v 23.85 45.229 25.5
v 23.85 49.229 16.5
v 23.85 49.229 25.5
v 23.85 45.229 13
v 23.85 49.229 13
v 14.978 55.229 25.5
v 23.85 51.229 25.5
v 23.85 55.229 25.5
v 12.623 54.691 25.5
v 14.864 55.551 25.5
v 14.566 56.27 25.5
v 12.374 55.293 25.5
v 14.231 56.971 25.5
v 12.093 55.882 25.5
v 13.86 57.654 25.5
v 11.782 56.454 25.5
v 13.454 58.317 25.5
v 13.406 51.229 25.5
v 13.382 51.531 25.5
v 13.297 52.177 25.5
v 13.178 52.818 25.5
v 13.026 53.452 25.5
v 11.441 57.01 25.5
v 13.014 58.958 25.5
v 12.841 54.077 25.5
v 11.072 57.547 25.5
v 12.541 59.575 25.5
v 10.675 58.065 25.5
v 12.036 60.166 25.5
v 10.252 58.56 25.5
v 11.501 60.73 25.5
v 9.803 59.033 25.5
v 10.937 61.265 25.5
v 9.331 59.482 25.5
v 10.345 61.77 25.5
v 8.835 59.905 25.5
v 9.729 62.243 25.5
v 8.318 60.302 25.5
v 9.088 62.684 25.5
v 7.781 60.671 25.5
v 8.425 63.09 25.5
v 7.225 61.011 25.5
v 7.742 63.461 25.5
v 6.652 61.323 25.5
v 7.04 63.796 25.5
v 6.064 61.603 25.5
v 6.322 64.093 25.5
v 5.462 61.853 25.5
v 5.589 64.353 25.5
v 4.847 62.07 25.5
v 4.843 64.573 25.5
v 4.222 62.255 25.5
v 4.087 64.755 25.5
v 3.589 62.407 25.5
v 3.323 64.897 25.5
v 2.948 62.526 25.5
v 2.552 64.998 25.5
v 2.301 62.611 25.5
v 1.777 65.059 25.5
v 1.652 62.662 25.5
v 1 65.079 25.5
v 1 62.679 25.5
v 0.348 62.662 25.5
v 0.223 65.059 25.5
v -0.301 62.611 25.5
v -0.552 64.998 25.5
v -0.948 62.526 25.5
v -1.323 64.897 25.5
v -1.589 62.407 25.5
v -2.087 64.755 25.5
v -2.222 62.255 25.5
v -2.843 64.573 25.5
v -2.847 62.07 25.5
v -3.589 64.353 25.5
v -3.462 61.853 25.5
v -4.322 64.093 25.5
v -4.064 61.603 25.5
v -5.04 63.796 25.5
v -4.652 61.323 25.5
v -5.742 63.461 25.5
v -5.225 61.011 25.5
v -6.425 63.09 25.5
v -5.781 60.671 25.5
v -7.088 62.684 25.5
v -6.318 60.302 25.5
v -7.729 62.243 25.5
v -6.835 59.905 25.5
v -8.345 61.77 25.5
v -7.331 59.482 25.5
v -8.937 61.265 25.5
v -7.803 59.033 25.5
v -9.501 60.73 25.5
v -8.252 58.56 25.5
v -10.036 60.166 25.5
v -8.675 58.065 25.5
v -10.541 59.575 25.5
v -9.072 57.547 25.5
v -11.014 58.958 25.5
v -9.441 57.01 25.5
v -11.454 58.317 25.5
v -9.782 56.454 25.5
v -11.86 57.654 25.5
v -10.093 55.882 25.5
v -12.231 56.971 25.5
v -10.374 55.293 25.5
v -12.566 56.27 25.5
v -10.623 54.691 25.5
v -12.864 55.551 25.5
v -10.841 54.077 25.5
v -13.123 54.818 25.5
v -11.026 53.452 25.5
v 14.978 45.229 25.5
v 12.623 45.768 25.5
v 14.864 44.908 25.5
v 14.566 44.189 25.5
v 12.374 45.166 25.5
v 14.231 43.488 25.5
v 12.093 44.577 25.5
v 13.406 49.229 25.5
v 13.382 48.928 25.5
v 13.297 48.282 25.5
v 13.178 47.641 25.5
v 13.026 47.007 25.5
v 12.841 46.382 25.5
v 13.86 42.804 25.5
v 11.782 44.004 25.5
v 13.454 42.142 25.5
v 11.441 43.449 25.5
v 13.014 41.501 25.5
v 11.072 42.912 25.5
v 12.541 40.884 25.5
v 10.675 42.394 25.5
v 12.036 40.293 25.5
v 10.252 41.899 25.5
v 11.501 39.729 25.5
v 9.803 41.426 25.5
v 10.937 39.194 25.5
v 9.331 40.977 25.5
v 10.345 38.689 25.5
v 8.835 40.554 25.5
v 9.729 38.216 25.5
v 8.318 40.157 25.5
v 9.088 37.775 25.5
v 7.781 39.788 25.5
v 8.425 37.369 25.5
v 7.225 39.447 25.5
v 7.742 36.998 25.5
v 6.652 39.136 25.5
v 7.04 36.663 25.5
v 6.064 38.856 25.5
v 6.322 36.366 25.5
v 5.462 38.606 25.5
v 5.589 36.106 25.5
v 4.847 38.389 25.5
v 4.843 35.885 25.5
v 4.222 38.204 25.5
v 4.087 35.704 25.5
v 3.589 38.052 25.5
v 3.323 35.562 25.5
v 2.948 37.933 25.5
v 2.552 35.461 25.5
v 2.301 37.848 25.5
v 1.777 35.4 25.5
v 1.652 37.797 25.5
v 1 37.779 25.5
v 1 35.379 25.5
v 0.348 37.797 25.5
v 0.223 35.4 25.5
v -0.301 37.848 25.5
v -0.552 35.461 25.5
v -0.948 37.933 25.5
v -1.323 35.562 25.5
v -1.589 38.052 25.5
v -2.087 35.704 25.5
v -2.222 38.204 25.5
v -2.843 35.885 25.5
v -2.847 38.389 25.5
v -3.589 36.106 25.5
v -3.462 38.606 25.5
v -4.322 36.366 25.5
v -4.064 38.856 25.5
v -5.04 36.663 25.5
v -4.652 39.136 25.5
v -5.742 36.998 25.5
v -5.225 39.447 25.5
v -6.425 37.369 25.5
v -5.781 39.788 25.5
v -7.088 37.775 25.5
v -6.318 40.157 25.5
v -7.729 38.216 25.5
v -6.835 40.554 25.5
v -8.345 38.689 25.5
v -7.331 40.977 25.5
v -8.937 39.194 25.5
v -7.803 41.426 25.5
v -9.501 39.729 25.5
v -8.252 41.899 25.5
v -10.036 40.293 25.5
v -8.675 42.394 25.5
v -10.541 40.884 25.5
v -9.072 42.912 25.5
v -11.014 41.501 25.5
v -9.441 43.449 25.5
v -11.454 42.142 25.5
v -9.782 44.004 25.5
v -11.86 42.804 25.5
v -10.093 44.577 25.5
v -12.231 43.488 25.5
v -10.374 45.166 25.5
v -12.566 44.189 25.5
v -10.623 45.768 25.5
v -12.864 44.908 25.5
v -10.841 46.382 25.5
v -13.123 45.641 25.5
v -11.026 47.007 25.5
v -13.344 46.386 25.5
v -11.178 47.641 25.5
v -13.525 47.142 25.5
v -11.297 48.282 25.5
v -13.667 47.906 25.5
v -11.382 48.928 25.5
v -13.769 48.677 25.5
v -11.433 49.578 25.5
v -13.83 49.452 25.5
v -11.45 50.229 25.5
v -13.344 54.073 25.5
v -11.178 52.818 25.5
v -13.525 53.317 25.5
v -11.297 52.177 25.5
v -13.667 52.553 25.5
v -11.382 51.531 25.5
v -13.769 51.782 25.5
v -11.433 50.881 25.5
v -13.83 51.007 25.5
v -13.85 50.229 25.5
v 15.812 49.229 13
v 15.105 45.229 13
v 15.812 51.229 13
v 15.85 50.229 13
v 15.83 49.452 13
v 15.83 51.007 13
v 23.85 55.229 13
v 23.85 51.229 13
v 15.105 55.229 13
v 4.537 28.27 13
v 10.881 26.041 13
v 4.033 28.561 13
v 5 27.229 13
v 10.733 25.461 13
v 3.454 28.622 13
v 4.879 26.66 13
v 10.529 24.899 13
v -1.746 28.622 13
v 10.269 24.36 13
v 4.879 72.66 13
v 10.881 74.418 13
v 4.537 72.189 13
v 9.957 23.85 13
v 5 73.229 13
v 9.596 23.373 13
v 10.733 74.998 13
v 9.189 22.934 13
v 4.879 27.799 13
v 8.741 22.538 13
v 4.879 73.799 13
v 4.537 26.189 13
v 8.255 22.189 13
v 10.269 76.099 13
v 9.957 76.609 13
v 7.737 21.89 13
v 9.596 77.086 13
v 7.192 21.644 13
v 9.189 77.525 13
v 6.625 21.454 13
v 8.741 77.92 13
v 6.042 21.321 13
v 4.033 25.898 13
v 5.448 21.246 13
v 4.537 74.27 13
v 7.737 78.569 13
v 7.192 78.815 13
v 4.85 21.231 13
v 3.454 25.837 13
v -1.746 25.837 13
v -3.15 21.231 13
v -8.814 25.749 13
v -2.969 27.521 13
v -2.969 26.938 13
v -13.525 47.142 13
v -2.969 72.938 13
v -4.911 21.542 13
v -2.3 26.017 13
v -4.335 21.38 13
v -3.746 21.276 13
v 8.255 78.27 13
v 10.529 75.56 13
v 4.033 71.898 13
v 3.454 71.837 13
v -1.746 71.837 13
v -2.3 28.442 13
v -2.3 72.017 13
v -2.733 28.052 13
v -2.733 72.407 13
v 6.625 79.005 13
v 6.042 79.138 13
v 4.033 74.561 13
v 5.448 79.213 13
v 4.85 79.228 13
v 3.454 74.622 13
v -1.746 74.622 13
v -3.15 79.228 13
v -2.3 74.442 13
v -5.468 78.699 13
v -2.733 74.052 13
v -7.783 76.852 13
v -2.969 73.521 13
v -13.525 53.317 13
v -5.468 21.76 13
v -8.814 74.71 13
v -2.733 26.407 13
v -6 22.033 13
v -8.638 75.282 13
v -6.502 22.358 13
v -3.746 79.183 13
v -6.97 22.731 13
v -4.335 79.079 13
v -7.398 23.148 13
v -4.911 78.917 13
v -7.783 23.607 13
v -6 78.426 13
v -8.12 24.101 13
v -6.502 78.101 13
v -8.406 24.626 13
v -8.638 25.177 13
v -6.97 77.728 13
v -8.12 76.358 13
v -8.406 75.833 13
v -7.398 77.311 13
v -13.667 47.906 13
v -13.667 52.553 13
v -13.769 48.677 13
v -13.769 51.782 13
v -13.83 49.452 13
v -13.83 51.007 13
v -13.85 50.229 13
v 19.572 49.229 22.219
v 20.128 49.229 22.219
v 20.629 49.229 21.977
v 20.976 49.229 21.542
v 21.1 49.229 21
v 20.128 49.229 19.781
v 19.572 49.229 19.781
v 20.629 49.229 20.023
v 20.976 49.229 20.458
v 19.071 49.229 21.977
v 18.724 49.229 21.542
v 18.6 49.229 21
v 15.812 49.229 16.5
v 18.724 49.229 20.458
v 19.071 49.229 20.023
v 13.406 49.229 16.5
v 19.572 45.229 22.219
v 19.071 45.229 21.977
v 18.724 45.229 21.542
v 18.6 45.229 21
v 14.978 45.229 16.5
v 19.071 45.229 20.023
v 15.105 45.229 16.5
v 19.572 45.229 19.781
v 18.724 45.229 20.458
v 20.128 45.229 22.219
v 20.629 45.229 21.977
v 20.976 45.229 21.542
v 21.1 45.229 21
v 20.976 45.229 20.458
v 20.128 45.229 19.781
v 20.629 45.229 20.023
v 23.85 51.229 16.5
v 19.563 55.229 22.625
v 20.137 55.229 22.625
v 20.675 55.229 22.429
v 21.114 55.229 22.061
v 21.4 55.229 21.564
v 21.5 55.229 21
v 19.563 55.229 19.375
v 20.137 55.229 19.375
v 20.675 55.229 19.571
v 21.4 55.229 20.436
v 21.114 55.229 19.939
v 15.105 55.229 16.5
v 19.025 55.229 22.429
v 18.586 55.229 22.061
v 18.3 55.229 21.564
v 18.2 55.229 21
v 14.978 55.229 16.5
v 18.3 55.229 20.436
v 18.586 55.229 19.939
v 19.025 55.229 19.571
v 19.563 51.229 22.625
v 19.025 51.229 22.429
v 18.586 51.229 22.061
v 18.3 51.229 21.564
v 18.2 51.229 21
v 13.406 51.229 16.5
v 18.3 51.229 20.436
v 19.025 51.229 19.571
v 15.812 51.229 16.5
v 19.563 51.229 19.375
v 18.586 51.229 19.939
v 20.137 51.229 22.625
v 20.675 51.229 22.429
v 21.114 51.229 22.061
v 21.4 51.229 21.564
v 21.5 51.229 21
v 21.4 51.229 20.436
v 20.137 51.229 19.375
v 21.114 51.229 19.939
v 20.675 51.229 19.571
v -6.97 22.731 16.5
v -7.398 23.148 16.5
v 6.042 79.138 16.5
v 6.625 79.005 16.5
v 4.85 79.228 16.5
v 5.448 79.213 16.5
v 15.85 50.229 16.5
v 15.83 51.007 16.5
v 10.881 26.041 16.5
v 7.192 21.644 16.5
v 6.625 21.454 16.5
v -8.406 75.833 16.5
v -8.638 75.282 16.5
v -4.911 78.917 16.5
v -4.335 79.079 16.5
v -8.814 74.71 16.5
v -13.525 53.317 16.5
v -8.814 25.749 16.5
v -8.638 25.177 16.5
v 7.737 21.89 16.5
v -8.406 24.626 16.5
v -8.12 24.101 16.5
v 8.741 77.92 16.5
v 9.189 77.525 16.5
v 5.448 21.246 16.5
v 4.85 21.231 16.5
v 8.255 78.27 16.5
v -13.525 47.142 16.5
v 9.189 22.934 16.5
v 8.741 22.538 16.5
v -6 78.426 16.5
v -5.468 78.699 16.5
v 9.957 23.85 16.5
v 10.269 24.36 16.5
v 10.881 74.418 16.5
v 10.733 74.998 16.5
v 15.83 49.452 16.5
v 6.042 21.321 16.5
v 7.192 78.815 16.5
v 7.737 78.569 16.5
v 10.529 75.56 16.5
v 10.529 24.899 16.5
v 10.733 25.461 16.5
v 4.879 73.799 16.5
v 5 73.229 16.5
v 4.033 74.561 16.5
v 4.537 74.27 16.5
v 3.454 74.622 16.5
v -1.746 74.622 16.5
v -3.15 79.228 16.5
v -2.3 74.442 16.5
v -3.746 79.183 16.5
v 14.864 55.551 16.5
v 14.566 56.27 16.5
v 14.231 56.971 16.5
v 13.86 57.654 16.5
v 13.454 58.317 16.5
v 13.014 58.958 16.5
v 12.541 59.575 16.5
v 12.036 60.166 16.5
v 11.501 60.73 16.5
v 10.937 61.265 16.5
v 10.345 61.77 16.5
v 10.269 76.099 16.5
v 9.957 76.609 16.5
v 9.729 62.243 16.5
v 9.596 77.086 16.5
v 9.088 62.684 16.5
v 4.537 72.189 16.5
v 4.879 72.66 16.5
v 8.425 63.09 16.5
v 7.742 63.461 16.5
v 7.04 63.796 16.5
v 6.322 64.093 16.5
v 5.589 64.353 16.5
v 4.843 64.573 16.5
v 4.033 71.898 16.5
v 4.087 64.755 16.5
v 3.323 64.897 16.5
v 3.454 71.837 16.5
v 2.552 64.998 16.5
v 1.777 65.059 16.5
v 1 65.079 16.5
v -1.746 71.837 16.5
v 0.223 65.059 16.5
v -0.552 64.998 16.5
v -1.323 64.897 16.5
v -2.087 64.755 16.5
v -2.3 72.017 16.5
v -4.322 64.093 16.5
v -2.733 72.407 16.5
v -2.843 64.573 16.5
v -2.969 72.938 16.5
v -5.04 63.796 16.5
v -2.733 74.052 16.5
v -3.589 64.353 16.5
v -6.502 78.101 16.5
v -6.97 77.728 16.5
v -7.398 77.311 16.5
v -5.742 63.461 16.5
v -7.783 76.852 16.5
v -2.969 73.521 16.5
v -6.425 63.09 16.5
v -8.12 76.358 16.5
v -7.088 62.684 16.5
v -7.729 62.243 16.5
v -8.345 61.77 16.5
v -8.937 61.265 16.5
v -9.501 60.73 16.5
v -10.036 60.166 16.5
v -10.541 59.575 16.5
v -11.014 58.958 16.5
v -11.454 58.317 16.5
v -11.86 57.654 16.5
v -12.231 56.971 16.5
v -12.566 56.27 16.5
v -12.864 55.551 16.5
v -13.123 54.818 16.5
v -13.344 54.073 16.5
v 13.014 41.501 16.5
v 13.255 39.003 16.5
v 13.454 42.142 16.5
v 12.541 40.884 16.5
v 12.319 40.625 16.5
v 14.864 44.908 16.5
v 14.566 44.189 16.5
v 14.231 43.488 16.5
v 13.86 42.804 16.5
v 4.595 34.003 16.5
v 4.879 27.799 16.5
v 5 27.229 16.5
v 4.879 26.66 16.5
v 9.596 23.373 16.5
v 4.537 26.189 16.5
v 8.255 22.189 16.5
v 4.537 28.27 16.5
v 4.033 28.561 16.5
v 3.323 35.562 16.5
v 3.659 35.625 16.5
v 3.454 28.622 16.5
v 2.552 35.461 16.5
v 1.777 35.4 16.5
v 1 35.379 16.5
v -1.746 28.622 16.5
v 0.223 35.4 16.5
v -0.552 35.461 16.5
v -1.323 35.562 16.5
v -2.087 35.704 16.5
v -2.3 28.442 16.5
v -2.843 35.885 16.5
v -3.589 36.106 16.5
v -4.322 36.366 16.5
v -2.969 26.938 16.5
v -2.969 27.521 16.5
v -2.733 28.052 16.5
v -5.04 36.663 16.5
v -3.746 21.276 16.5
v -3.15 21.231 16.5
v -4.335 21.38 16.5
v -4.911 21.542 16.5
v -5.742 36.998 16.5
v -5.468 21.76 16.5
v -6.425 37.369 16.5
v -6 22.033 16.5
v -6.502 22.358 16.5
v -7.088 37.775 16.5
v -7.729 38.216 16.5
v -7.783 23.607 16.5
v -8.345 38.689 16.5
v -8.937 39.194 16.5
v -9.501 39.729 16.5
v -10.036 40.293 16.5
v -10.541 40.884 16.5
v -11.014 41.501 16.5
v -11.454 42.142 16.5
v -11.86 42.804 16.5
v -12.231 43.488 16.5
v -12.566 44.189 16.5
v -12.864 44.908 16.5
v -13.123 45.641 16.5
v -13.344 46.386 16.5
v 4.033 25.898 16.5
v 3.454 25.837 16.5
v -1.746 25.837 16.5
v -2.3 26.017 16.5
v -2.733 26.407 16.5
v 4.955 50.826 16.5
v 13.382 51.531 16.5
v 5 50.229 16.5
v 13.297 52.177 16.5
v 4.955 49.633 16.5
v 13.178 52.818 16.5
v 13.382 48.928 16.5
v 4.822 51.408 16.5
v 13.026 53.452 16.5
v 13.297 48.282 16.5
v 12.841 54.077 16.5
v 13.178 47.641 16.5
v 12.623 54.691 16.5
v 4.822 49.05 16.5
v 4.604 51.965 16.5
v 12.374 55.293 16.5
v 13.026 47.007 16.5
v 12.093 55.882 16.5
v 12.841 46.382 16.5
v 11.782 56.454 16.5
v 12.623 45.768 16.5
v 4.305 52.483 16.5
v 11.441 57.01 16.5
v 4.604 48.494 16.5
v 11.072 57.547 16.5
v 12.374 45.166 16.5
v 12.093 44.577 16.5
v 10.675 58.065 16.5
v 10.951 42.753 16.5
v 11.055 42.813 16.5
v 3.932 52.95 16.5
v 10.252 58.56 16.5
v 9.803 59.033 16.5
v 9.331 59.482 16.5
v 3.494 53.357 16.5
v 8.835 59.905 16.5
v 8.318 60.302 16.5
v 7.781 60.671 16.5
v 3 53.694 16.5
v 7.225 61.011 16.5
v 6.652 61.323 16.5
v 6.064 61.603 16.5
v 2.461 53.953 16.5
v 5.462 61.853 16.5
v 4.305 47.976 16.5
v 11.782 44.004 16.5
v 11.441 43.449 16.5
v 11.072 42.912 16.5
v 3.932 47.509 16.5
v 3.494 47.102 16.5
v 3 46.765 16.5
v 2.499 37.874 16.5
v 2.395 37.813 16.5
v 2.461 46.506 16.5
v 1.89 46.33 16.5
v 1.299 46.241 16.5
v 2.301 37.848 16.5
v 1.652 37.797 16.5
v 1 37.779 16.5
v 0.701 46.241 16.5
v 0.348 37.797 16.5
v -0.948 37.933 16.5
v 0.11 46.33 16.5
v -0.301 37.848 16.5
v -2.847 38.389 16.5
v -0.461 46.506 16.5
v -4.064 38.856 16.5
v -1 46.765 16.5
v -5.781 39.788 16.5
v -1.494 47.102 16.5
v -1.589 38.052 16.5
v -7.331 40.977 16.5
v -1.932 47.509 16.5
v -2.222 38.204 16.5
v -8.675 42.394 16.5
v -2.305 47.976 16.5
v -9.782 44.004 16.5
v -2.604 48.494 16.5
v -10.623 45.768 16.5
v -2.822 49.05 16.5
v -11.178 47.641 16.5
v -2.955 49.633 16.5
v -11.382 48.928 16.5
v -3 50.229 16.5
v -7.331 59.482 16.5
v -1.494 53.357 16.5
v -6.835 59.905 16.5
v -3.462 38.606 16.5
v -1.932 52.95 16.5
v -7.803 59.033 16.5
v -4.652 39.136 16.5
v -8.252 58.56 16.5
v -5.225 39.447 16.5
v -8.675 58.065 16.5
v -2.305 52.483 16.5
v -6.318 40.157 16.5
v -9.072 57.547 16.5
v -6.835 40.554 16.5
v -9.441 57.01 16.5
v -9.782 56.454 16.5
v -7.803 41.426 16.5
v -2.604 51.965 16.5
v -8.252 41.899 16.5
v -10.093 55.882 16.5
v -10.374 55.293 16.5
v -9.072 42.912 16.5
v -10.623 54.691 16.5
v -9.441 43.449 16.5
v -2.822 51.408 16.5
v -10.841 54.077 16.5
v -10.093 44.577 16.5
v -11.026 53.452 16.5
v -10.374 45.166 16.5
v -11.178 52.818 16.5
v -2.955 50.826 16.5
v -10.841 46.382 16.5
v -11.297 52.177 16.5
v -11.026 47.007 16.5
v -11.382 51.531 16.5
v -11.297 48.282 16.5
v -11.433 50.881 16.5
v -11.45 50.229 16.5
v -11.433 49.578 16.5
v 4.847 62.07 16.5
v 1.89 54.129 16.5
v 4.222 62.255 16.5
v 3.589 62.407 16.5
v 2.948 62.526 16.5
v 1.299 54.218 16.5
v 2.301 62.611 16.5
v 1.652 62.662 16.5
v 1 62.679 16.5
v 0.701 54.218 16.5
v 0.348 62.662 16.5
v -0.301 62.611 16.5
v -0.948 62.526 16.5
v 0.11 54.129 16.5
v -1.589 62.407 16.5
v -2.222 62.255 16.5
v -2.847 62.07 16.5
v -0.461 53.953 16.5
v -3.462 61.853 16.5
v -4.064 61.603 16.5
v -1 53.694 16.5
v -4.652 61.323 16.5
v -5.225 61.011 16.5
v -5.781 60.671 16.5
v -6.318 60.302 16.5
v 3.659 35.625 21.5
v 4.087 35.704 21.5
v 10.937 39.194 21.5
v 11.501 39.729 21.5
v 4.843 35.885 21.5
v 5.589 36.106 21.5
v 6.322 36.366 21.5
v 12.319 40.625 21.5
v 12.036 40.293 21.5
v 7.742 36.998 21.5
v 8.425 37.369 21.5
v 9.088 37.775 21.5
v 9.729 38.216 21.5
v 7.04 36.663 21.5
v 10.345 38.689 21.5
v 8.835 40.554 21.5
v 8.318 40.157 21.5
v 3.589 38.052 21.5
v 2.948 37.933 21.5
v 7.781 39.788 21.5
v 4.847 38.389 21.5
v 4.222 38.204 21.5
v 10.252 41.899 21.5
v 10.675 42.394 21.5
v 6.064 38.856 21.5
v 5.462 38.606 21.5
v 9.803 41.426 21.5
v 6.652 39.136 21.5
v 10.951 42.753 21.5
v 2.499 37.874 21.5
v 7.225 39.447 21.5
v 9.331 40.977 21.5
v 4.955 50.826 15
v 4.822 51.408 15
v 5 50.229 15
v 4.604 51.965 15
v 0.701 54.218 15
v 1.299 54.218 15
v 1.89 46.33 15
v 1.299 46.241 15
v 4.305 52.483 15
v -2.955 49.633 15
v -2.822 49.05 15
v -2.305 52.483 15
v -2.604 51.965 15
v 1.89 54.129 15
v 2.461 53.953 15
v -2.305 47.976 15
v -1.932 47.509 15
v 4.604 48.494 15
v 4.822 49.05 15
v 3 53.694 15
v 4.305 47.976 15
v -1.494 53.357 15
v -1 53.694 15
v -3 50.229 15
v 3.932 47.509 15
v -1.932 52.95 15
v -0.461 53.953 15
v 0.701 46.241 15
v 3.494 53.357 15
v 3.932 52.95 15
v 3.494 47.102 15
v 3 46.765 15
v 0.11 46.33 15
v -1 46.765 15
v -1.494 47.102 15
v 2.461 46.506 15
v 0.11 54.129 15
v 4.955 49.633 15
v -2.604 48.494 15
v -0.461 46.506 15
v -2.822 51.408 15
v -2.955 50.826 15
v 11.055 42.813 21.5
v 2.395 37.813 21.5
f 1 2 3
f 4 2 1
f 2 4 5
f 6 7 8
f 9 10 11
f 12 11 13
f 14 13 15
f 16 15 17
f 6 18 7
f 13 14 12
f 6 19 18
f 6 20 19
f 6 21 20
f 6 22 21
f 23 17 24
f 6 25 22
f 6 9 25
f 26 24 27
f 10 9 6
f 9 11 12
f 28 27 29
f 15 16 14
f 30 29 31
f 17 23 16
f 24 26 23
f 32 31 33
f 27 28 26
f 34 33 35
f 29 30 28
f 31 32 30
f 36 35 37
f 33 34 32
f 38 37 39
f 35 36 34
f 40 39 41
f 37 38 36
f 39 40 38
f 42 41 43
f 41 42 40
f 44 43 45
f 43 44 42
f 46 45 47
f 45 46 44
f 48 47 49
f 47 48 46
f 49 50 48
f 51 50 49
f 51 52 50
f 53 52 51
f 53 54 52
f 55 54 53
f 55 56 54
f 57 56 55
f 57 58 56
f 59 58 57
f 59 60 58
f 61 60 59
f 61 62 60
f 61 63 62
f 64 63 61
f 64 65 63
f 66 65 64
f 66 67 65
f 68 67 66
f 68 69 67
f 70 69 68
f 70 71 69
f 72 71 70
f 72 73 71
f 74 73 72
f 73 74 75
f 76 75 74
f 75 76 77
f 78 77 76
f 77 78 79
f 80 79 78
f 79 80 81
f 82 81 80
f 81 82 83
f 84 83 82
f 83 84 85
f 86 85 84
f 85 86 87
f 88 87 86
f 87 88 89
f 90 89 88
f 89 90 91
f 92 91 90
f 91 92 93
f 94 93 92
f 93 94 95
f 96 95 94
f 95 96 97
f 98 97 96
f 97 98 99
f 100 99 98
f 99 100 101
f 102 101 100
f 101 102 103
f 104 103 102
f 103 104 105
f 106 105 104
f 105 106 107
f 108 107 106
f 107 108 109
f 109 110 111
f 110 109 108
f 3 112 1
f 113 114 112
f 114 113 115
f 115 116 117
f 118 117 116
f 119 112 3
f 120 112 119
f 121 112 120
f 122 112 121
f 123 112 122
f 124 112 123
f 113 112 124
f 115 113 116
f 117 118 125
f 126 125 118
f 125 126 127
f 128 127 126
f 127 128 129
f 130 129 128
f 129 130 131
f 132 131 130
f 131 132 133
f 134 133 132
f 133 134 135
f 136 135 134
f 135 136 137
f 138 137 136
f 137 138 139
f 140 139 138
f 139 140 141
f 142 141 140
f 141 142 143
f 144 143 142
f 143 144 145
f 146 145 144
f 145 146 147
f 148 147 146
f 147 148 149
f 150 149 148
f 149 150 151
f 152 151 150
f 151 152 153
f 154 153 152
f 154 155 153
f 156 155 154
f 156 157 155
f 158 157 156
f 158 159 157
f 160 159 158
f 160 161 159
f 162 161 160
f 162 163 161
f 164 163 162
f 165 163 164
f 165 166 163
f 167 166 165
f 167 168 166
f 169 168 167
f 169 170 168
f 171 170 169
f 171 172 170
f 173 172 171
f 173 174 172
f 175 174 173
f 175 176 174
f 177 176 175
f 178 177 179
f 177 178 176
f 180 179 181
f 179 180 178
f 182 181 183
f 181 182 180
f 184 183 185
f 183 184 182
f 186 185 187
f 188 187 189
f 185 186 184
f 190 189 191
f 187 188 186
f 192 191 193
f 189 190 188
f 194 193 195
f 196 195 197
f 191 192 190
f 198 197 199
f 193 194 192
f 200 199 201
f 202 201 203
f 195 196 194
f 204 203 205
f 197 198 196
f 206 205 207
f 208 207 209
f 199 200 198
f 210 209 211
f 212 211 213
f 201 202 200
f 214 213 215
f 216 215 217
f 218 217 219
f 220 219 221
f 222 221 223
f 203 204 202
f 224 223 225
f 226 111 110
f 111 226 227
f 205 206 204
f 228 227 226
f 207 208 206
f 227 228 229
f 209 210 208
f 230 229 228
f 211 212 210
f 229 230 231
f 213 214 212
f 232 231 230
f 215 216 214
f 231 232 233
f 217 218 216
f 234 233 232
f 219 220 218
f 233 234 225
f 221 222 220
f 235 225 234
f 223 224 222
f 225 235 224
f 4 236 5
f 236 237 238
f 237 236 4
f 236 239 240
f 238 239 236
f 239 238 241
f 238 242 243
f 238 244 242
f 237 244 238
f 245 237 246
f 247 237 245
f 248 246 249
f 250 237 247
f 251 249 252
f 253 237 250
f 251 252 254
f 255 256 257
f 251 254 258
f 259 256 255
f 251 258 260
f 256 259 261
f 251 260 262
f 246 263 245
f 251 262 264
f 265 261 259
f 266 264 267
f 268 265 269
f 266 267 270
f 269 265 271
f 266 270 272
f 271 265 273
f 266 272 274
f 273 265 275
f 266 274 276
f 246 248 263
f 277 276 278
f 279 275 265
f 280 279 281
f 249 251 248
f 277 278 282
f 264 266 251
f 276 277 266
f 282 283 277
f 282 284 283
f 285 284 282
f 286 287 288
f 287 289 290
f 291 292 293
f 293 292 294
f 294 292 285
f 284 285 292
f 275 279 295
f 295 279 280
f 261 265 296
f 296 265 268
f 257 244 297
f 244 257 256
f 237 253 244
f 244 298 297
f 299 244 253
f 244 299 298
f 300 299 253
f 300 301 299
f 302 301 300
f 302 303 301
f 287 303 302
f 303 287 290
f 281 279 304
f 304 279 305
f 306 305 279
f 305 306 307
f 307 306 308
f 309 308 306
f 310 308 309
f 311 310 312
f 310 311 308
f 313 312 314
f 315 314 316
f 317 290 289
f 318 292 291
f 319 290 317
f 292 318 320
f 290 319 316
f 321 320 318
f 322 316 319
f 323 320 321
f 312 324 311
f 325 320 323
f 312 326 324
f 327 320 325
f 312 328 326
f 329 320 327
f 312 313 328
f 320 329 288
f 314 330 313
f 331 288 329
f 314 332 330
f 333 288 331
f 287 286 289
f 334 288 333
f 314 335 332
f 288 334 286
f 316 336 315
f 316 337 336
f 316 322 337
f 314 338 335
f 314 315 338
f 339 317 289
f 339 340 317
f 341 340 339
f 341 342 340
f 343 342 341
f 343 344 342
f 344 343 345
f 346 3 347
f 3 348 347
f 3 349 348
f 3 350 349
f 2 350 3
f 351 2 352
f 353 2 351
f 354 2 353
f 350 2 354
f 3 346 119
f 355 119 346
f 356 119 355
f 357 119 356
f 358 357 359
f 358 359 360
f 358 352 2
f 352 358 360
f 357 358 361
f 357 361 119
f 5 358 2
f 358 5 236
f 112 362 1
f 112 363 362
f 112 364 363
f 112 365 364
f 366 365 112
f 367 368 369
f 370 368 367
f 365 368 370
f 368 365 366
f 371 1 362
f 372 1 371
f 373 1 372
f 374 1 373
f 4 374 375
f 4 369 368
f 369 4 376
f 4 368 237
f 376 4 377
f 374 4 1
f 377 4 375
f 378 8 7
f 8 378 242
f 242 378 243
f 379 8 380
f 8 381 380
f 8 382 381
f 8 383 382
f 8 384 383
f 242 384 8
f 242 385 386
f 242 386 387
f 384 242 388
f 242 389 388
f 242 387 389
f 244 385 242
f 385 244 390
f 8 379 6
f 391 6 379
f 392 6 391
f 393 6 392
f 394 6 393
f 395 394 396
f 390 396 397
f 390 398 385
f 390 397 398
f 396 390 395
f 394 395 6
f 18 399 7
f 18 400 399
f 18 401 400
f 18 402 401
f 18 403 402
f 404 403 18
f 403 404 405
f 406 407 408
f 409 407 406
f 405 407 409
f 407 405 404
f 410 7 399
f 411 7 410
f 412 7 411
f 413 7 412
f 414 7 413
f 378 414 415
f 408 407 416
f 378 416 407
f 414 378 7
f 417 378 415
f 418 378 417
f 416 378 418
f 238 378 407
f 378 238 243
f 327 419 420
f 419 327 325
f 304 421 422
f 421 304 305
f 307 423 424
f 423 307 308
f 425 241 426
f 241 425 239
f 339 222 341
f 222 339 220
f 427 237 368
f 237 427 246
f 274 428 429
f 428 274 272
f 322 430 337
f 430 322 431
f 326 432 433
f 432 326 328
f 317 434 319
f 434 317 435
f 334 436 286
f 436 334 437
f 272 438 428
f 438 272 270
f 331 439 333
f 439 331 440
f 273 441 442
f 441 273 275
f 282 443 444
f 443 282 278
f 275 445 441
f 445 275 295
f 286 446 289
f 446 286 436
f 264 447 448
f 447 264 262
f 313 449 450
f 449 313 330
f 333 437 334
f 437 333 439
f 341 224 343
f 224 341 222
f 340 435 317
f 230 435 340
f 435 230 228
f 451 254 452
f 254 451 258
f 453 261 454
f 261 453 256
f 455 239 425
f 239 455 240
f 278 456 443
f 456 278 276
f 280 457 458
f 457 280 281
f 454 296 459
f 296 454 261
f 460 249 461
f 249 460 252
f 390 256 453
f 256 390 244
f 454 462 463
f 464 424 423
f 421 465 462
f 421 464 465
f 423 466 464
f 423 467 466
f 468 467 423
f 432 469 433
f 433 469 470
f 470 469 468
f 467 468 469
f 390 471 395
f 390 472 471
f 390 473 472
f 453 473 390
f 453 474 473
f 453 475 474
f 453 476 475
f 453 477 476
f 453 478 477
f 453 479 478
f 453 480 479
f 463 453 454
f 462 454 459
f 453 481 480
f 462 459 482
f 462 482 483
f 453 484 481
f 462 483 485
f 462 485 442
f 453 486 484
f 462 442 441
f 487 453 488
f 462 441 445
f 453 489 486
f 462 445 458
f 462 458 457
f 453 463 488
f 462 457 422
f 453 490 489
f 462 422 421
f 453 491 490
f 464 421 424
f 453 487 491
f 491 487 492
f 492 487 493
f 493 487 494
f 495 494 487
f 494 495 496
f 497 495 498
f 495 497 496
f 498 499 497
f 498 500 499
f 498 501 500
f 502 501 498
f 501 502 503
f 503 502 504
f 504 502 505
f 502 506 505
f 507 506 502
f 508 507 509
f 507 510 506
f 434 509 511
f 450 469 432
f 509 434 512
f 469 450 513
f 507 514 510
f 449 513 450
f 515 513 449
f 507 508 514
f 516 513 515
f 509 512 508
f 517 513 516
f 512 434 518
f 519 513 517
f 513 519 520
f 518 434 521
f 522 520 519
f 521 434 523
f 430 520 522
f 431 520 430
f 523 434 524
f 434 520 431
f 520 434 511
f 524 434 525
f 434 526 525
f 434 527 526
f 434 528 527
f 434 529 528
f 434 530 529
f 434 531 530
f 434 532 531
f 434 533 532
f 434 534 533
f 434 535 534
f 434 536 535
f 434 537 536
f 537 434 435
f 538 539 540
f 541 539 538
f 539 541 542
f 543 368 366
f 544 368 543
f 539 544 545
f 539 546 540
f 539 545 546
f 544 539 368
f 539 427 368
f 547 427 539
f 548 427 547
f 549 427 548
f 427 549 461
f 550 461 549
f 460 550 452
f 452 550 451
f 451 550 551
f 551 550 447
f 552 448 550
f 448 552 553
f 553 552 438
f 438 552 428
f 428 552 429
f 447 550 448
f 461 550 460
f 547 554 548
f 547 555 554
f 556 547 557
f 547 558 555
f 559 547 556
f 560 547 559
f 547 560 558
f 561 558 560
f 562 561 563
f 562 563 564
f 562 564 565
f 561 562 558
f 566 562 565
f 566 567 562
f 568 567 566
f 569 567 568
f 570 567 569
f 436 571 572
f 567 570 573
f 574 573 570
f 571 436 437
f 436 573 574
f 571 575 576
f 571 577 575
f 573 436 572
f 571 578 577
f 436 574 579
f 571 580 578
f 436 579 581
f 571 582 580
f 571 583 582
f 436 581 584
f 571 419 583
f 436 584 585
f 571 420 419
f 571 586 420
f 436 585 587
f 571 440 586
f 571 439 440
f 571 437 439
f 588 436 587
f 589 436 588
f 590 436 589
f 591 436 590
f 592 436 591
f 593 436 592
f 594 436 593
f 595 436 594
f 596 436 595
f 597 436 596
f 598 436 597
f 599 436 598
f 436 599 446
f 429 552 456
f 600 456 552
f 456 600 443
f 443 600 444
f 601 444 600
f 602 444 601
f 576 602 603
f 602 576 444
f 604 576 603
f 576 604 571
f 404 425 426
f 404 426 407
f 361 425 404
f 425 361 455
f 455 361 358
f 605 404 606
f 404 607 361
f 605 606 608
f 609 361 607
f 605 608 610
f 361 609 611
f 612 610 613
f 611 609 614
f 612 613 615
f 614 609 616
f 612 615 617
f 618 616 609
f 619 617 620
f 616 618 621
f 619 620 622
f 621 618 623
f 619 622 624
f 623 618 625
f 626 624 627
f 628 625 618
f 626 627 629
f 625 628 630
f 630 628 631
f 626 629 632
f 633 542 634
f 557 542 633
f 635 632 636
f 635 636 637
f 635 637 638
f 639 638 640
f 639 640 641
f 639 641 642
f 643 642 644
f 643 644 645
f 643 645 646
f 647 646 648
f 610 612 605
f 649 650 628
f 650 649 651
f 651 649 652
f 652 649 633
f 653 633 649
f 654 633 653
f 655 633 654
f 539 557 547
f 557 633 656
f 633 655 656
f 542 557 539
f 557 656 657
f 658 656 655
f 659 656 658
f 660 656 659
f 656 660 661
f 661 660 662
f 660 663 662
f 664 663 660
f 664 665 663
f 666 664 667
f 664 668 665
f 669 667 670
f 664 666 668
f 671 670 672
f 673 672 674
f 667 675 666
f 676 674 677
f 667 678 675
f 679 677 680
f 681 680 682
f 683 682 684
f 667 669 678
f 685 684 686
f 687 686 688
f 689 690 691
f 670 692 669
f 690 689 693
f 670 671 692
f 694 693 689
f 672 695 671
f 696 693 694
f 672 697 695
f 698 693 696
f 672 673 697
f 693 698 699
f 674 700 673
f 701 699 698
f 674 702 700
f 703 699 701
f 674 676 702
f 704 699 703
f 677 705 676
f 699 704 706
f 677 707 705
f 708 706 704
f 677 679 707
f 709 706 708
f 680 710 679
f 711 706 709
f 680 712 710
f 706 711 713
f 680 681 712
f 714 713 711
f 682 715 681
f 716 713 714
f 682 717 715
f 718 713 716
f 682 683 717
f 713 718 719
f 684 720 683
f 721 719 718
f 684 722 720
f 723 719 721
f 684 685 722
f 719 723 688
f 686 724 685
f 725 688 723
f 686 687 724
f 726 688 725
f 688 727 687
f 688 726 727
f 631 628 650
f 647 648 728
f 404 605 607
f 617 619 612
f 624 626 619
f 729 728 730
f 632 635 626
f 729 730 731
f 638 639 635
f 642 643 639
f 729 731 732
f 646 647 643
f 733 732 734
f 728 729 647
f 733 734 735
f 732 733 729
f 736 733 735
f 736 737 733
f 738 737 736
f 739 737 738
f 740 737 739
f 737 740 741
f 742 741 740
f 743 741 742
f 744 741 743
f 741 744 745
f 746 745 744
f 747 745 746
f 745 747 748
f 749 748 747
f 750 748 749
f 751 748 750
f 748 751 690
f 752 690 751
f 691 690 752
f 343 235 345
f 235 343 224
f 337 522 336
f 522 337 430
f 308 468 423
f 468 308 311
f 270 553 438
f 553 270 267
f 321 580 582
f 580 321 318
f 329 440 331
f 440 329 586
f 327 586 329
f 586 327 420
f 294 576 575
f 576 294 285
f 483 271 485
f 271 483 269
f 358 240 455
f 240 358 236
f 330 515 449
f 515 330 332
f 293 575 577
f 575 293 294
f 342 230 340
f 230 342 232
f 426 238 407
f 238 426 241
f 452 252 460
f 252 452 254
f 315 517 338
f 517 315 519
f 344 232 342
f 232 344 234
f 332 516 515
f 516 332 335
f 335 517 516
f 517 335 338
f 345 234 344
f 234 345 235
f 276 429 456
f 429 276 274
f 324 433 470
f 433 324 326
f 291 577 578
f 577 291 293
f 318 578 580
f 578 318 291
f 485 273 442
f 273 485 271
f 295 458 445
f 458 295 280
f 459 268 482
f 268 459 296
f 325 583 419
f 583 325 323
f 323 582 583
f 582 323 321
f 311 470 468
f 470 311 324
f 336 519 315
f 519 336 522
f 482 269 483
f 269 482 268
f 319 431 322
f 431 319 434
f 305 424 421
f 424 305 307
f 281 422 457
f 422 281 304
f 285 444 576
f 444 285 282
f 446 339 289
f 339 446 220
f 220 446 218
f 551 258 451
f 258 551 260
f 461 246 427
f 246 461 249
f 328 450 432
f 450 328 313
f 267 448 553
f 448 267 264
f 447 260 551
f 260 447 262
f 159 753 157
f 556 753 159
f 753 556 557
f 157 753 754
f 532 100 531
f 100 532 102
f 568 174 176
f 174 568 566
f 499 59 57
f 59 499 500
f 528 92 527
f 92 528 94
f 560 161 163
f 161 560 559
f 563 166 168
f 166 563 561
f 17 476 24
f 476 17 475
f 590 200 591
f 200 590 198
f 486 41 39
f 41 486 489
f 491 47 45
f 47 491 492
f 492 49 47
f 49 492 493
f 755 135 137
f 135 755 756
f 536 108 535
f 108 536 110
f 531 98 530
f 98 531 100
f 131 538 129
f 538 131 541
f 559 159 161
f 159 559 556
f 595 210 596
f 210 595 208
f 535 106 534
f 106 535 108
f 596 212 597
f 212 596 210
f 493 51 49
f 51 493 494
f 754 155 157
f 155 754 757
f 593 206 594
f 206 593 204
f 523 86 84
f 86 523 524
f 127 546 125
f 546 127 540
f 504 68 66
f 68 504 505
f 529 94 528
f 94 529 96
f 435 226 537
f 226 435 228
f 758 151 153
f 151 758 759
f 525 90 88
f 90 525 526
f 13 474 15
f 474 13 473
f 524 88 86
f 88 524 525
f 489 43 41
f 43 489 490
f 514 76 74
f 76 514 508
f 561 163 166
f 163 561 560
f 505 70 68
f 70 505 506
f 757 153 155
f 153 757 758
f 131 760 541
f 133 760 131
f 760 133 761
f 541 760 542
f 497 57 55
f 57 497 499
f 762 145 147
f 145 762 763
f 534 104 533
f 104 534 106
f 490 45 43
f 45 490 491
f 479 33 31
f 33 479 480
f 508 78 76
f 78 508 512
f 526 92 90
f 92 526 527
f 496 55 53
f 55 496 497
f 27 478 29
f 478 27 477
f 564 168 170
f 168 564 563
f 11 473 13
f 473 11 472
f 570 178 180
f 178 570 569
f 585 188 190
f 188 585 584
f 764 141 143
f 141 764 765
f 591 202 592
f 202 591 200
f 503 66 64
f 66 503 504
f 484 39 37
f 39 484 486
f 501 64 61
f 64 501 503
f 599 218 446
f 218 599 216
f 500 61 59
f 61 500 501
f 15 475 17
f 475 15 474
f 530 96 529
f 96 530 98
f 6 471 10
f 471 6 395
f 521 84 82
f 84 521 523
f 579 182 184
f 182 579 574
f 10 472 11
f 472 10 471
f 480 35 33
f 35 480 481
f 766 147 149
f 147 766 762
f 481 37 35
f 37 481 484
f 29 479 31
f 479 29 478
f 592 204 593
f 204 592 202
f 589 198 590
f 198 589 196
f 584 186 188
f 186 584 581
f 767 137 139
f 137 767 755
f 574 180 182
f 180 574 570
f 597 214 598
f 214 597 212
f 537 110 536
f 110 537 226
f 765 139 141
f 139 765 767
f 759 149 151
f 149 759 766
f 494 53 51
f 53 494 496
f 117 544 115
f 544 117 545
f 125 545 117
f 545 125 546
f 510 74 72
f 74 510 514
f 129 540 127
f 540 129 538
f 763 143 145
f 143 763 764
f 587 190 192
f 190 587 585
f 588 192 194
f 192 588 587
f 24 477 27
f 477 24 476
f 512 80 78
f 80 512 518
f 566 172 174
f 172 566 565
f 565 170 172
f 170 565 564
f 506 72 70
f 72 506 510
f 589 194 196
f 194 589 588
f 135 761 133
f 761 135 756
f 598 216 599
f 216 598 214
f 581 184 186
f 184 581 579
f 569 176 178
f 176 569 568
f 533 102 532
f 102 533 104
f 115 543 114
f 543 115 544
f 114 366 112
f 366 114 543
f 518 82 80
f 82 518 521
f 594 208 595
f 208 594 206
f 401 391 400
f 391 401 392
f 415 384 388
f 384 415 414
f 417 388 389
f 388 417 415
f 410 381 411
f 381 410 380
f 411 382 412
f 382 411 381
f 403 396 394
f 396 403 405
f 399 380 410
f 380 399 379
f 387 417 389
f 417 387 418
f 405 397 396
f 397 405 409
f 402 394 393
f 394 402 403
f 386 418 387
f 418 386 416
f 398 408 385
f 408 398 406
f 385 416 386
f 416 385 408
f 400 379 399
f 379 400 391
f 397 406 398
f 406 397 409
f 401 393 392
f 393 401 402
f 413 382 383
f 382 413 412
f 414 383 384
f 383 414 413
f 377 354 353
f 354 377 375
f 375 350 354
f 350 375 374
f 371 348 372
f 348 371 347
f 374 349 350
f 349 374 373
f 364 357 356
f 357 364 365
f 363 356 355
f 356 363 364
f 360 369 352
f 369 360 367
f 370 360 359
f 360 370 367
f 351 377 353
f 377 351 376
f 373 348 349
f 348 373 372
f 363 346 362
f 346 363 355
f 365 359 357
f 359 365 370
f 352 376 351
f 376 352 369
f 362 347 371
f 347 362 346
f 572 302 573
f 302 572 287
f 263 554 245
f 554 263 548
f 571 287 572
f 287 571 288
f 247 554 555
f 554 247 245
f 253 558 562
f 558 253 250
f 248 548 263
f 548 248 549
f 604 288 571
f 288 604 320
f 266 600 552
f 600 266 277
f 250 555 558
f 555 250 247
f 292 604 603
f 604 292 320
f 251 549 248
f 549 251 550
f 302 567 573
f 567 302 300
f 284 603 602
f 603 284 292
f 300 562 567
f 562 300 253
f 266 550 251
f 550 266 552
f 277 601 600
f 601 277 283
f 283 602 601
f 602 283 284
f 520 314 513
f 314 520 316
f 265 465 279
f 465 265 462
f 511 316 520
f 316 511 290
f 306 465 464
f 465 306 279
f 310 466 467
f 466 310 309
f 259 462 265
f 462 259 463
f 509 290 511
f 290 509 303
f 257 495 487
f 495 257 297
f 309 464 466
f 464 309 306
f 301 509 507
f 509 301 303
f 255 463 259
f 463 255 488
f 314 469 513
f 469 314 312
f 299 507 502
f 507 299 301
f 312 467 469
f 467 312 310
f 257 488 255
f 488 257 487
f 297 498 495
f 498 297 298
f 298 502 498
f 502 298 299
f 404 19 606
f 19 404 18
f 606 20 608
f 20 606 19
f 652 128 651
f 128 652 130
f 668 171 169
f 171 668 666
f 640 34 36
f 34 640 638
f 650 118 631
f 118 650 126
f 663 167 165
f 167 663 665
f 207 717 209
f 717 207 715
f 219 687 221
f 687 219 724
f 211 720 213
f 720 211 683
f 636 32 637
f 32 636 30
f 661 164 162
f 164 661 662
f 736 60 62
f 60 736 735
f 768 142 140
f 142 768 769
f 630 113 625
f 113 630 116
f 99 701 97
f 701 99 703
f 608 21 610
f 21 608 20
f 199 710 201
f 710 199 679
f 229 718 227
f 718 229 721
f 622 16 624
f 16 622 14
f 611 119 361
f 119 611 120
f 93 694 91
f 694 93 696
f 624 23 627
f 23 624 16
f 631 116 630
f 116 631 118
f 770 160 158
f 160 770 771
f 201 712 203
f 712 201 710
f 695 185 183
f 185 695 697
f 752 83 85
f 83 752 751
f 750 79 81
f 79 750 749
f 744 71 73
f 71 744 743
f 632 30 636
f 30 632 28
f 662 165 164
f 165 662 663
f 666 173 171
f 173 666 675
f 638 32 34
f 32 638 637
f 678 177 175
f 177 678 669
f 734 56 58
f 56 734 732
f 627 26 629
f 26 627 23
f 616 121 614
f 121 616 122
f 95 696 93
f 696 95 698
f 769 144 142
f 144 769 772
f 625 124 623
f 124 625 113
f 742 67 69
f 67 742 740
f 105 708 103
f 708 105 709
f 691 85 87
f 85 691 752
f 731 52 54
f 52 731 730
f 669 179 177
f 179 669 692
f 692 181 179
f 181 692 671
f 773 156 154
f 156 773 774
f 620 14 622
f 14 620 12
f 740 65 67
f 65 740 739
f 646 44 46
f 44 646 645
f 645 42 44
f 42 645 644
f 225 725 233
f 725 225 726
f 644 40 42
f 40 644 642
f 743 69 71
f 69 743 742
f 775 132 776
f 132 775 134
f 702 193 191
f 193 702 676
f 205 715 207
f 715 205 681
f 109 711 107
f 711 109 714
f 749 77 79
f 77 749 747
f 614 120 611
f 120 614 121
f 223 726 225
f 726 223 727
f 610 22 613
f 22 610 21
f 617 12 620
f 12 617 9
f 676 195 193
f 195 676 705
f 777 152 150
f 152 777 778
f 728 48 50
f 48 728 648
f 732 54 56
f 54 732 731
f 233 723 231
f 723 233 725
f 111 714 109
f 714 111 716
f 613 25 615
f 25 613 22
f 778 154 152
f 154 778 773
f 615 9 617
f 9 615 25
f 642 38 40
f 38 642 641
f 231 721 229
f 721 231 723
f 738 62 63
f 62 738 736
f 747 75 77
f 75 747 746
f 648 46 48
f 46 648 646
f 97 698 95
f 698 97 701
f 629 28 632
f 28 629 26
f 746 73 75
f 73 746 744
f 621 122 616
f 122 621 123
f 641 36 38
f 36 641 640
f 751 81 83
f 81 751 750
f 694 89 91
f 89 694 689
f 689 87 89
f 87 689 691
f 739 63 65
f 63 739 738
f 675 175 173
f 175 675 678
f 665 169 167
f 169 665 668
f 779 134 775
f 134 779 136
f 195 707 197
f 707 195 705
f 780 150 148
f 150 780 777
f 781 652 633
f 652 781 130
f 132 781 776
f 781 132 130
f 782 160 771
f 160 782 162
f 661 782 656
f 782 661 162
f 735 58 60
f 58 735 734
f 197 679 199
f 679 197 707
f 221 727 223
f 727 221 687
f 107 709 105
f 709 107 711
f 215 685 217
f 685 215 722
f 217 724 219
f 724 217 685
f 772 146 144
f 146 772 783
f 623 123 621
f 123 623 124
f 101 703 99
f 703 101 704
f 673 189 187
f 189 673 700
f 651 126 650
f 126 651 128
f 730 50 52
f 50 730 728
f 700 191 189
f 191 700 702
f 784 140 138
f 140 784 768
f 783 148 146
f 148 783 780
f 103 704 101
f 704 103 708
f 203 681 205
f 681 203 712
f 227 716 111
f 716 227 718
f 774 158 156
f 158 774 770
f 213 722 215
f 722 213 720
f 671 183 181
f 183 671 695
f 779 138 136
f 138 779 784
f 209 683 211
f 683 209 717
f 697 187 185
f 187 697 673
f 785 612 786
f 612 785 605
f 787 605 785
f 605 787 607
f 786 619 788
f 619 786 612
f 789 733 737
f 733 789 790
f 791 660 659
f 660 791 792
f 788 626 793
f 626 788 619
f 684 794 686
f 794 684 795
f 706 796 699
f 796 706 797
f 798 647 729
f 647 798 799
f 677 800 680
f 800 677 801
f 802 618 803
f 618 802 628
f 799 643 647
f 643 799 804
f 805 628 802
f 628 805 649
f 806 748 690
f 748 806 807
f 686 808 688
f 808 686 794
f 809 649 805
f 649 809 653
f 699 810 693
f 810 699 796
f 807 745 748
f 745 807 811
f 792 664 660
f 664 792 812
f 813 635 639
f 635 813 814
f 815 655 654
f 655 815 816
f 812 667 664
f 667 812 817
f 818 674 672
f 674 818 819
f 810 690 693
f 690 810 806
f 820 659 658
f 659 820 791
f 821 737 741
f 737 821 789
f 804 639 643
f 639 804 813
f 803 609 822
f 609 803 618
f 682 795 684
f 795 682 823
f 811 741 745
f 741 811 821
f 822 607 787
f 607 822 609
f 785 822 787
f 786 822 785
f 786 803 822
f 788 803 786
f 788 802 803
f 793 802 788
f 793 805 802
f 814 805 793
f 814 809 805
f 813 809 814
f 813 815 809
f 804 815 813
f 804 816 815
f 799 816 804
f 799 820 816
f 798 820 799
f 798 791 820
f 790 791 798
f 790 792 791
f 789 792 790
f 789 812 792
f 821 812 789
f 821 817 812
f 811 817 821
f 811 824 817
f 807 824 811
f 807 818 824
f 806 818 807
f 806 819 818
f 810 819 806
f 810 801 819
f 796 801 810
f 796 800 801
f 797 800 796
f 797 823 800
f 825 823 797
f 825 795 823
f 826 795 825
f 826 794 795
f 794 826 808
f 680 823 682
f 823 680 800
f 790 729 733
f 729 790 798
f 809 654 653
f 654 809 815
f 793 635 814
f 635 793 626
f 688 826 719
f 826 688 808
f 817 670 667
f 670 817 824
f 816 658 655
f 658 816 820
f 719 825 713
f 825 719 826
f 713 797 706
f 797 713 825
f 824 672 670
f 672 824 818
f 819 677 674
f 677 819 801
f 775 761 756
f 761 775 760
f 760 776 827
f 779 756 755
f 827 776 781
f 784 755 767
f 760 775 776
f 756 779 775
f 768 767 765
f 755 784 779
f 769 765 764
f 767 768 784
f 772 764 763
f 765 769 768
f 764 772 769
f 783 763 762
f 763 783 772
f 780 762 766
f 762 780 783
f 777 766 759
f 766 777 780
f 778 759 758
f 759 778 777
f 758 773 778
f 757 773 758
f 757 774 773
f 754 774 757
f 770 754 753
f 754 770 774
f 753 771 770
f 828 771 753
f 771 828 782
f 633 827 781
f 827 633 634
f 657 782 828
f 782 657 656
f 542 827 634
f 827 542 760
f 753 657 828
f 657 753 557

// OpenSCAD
// file: ../../lib/common.scad
// ============================================================================
//  Вспомогательные модули общего назначения.
//  Подключать через use <lib/common.scad> — файл не содержит параметров
//  проекта и ни от чего не зависит.
// ============================================================================

_eps = 0.01;

// --------------------------------------------------------------------- 2D ---
// Прямоугольник со скруглёнными углами, по центру
module rrect(w, d, r) {
    rr = min(r, w/2 - _eps, d/2 - _eps);
    if (rr > 0) offset(r = rr) square([w - 2*rr, d - 2*rr], center = true);
    else square([w, d], center = true);
}

// --------------------------------------------------------------------- 3D ---
// Коробка со скруглением ТОЛЬКО вертикальных рёбер: нижние и верхние острые
module rounded_box(w, d, h, r) linear_extrude(height = h) rrect(w, d, r);

// Цилиндр с фасками на торцах (снимает «слоновью ногу» и облегчает посадку)
module chamfered_cyl(d, h, ch = 0.6, bottom = true, top = true) {
    r  = d/2;
    cb = bottom ? min(ch, h/2) : 0;
    ct = top    ? min(ch, h/2) : 0;
    if (cb <= 0 && ct <= 0) cylinder(d = d, h = h);
    else rotate_extrude(angle = 360) polygon(concat(
        [[0, 0]],
        cb > 0 ? [[r - cb, 0], [r, cb]] : [[r, 0]],
        ct > 0 ? [[r, h - ct], [r - ct, h]] : [[r, h]],
        [[0, h]]));
}

// Труба
module tube(od, id, h) difference() {
    cylinder(d = od, h = h);
    translate([0, 0, -_eps]) cylinder(d = id, h = h + 2*_eps);
}

// Сквозное отверстие, растянутое вверх-вниз для гарантированного вычитания
module thru(d, h) translate([0, 0, -_eps]) cylinder(d = d, h = h + 2*_eps);

// Потайное отверстие под саморез с конической головкой.
// Пластина занимает z = [0 .. t], головка утапливается сверху,
// саморез идёт вниз (в ответную стойку).
module countersunk_hole(free_d, head_d, t, down = 30) {
    cone_h = (head_d - free_d)/2;    // головка 90 градусов
    union() {
        translate([0, 0, -down]) cylinder(d = free_d, h = down + t - cone_h + _eps);
        translate([0, 0, t - cone_h]) cylinder(d1 = free_d, d2 = head_d, h = cone_h);
    }
}

// Паз (щелевое отверстие) длиной len по X, сквозной по высоте h
module slot(len, d, h) hull() for (s = [-1, 1])
    translate([s*(len - d)/2, 0, 0]) cylinder(d = d, h = h);

// Стойка под саморез: цилиндр с пилотным отверстием сверху.
// Снизу фаски нет — стойка растёт из дна детали.
module screw_boss(od, h, pilot_d, pilot_depth, ch = 0.6) difference() {
    chamfered_cyl(od, h, ch = ch, bottom = false, top = true);
    translate([0, 0, h - pilot_depth]) cylinder(d = pilot_d, h = pilot_depth + _eps);
}

// Треугольная косынка в плоскости XZ (катеты l по X и h по Z), толщина t по Y
module gusset(l, h, t) translate([0, -t/2, 0]) linear_extrude(height = t)
    polygon([[0, 0], [l, 0], [0, h]]);

// Конусное гнездо под заточенный винт-ось (ось Z вниз от z=0)
module cone_seat(d, depth) translate([0, 0, -depth])
    cylinder(d1 = 0.2, d2 = d, h = depth + _eps);

// Канавка под круглый пассик: тор, вычитаемый из обода
module belt_groove(pulley_d, groove_r) rotate_extrude(angle = 360)
    translate([pulley_d/2, 0]) circle(r = groove_r);

// Сетка облегчающих отверстий по кругу
module radial_holes(n, r, d, h) for (i = [0 : n - 1])
    rotate([0, 0, i*360/n]) translate([r, 0, 0]) thru(d, h);
// main file
// ============================================================================
//  ДЕРЖАТЕЛЬ ДВИГАТЕЛЯ RF-300C-14270
//
//  Стакан с хомутом: двигатель стоит донцем на дне держателя валом вверх,
//  обжимается стяжным винтом 3 x 16. Толщина дна выставляет канавку
//  заводского колеса ровно в плоскость пассика 1 (см. motor_groove_z).
//  Две лапы с пазами вдоль линии «промвал — двигатель»: сдвигом
//  натягивается пассик 1. Крепится к шасси двумя саморезами 2.5 x 8.
//
//  Самая «расходная» деталь модуля: другой двигатель или неточная высота
//  канавки — перепечатывается только она.
//
//  Печать: как есть, дном на стол.
// ============================================================================

include <../drive_params.scad>
use <../../lib/common.scad>

module drive_motor_holder() {
    cup_top = holder_base_t + holder_cup_h;
    translate([motor_pos[0], motor_pos[1], holder_z0]) rotate([0, 0, motor_angle])
    difference() {
        union() {
            // основание с лапами
            hull() {
                cylinder(d = holder_cup_od, h = holder_base_t);
                for (s = [-1, 1], dx = [-1, 1])
                    translate([dx*holder_slot_len/2, s*holder_foot_span/2, 0])
                        cylinder(d = holder_foot_d, h = holder_base_t);
            }
            cylinder(d = holder_cup_od, h = cup_top);
            // уши стяжного винта — с внешней стороны, подальше от пассика
            for (s = [-1, 1])
                translate([holder_cup_od/2 - holder_wall, s == 1 ? 1 : -5, 0])
                    cube([holder_wall + holder_ear, 4, cup_top]);
        }
        // гнездо двигателя и выемка под выступ на донце
        translate([0, 0, holder_base_t]) cylinder(d = holder_cup_id, h = cup_top);
        translate([0, 0, holder_base_t - motor_bump_h]) cylinder(d = motor_bump_d, h = motor_bump_h + eps);
        // вырез под провода у донца
        rotate([0, 0, motor_wire_angle])
            translate([holder_cup_id/2 - 1, -5, holder_base_t])
                cube([holder_wall + 2, 10, 5]);
        // прорезь хомута
        translate([0, -1, holder_base_t])
            cube([holder_cup_od/2 + holder_ear + 1, 2, cup_top]);
        // Стяжной винт: проходное с одной стороны, пилотное с другой.
        // Головка — с противоположной от платы регулятора стороны, иначе
        // плата закрывает подход отвёртке.
        translate([holder_cup_od/2 + holder_ear/2, 0, holder_base_t + holder_cup_h/2])
            rotate([-90, 0, 0]) {
                cylinder(d = scr3_free, h = 10);
                translate([0, 0, -10]) cylinder(d = scr3_pilot, h = 10);
            }
        // пазы крепления
        for (s = [-1, 1])
            translate([0, s*holder_foot_span/2, -eps])
                slot(holder_slot_len, scr25_free, holder_base_t + 2*eps);
    }
}

drive_motor_holder();
